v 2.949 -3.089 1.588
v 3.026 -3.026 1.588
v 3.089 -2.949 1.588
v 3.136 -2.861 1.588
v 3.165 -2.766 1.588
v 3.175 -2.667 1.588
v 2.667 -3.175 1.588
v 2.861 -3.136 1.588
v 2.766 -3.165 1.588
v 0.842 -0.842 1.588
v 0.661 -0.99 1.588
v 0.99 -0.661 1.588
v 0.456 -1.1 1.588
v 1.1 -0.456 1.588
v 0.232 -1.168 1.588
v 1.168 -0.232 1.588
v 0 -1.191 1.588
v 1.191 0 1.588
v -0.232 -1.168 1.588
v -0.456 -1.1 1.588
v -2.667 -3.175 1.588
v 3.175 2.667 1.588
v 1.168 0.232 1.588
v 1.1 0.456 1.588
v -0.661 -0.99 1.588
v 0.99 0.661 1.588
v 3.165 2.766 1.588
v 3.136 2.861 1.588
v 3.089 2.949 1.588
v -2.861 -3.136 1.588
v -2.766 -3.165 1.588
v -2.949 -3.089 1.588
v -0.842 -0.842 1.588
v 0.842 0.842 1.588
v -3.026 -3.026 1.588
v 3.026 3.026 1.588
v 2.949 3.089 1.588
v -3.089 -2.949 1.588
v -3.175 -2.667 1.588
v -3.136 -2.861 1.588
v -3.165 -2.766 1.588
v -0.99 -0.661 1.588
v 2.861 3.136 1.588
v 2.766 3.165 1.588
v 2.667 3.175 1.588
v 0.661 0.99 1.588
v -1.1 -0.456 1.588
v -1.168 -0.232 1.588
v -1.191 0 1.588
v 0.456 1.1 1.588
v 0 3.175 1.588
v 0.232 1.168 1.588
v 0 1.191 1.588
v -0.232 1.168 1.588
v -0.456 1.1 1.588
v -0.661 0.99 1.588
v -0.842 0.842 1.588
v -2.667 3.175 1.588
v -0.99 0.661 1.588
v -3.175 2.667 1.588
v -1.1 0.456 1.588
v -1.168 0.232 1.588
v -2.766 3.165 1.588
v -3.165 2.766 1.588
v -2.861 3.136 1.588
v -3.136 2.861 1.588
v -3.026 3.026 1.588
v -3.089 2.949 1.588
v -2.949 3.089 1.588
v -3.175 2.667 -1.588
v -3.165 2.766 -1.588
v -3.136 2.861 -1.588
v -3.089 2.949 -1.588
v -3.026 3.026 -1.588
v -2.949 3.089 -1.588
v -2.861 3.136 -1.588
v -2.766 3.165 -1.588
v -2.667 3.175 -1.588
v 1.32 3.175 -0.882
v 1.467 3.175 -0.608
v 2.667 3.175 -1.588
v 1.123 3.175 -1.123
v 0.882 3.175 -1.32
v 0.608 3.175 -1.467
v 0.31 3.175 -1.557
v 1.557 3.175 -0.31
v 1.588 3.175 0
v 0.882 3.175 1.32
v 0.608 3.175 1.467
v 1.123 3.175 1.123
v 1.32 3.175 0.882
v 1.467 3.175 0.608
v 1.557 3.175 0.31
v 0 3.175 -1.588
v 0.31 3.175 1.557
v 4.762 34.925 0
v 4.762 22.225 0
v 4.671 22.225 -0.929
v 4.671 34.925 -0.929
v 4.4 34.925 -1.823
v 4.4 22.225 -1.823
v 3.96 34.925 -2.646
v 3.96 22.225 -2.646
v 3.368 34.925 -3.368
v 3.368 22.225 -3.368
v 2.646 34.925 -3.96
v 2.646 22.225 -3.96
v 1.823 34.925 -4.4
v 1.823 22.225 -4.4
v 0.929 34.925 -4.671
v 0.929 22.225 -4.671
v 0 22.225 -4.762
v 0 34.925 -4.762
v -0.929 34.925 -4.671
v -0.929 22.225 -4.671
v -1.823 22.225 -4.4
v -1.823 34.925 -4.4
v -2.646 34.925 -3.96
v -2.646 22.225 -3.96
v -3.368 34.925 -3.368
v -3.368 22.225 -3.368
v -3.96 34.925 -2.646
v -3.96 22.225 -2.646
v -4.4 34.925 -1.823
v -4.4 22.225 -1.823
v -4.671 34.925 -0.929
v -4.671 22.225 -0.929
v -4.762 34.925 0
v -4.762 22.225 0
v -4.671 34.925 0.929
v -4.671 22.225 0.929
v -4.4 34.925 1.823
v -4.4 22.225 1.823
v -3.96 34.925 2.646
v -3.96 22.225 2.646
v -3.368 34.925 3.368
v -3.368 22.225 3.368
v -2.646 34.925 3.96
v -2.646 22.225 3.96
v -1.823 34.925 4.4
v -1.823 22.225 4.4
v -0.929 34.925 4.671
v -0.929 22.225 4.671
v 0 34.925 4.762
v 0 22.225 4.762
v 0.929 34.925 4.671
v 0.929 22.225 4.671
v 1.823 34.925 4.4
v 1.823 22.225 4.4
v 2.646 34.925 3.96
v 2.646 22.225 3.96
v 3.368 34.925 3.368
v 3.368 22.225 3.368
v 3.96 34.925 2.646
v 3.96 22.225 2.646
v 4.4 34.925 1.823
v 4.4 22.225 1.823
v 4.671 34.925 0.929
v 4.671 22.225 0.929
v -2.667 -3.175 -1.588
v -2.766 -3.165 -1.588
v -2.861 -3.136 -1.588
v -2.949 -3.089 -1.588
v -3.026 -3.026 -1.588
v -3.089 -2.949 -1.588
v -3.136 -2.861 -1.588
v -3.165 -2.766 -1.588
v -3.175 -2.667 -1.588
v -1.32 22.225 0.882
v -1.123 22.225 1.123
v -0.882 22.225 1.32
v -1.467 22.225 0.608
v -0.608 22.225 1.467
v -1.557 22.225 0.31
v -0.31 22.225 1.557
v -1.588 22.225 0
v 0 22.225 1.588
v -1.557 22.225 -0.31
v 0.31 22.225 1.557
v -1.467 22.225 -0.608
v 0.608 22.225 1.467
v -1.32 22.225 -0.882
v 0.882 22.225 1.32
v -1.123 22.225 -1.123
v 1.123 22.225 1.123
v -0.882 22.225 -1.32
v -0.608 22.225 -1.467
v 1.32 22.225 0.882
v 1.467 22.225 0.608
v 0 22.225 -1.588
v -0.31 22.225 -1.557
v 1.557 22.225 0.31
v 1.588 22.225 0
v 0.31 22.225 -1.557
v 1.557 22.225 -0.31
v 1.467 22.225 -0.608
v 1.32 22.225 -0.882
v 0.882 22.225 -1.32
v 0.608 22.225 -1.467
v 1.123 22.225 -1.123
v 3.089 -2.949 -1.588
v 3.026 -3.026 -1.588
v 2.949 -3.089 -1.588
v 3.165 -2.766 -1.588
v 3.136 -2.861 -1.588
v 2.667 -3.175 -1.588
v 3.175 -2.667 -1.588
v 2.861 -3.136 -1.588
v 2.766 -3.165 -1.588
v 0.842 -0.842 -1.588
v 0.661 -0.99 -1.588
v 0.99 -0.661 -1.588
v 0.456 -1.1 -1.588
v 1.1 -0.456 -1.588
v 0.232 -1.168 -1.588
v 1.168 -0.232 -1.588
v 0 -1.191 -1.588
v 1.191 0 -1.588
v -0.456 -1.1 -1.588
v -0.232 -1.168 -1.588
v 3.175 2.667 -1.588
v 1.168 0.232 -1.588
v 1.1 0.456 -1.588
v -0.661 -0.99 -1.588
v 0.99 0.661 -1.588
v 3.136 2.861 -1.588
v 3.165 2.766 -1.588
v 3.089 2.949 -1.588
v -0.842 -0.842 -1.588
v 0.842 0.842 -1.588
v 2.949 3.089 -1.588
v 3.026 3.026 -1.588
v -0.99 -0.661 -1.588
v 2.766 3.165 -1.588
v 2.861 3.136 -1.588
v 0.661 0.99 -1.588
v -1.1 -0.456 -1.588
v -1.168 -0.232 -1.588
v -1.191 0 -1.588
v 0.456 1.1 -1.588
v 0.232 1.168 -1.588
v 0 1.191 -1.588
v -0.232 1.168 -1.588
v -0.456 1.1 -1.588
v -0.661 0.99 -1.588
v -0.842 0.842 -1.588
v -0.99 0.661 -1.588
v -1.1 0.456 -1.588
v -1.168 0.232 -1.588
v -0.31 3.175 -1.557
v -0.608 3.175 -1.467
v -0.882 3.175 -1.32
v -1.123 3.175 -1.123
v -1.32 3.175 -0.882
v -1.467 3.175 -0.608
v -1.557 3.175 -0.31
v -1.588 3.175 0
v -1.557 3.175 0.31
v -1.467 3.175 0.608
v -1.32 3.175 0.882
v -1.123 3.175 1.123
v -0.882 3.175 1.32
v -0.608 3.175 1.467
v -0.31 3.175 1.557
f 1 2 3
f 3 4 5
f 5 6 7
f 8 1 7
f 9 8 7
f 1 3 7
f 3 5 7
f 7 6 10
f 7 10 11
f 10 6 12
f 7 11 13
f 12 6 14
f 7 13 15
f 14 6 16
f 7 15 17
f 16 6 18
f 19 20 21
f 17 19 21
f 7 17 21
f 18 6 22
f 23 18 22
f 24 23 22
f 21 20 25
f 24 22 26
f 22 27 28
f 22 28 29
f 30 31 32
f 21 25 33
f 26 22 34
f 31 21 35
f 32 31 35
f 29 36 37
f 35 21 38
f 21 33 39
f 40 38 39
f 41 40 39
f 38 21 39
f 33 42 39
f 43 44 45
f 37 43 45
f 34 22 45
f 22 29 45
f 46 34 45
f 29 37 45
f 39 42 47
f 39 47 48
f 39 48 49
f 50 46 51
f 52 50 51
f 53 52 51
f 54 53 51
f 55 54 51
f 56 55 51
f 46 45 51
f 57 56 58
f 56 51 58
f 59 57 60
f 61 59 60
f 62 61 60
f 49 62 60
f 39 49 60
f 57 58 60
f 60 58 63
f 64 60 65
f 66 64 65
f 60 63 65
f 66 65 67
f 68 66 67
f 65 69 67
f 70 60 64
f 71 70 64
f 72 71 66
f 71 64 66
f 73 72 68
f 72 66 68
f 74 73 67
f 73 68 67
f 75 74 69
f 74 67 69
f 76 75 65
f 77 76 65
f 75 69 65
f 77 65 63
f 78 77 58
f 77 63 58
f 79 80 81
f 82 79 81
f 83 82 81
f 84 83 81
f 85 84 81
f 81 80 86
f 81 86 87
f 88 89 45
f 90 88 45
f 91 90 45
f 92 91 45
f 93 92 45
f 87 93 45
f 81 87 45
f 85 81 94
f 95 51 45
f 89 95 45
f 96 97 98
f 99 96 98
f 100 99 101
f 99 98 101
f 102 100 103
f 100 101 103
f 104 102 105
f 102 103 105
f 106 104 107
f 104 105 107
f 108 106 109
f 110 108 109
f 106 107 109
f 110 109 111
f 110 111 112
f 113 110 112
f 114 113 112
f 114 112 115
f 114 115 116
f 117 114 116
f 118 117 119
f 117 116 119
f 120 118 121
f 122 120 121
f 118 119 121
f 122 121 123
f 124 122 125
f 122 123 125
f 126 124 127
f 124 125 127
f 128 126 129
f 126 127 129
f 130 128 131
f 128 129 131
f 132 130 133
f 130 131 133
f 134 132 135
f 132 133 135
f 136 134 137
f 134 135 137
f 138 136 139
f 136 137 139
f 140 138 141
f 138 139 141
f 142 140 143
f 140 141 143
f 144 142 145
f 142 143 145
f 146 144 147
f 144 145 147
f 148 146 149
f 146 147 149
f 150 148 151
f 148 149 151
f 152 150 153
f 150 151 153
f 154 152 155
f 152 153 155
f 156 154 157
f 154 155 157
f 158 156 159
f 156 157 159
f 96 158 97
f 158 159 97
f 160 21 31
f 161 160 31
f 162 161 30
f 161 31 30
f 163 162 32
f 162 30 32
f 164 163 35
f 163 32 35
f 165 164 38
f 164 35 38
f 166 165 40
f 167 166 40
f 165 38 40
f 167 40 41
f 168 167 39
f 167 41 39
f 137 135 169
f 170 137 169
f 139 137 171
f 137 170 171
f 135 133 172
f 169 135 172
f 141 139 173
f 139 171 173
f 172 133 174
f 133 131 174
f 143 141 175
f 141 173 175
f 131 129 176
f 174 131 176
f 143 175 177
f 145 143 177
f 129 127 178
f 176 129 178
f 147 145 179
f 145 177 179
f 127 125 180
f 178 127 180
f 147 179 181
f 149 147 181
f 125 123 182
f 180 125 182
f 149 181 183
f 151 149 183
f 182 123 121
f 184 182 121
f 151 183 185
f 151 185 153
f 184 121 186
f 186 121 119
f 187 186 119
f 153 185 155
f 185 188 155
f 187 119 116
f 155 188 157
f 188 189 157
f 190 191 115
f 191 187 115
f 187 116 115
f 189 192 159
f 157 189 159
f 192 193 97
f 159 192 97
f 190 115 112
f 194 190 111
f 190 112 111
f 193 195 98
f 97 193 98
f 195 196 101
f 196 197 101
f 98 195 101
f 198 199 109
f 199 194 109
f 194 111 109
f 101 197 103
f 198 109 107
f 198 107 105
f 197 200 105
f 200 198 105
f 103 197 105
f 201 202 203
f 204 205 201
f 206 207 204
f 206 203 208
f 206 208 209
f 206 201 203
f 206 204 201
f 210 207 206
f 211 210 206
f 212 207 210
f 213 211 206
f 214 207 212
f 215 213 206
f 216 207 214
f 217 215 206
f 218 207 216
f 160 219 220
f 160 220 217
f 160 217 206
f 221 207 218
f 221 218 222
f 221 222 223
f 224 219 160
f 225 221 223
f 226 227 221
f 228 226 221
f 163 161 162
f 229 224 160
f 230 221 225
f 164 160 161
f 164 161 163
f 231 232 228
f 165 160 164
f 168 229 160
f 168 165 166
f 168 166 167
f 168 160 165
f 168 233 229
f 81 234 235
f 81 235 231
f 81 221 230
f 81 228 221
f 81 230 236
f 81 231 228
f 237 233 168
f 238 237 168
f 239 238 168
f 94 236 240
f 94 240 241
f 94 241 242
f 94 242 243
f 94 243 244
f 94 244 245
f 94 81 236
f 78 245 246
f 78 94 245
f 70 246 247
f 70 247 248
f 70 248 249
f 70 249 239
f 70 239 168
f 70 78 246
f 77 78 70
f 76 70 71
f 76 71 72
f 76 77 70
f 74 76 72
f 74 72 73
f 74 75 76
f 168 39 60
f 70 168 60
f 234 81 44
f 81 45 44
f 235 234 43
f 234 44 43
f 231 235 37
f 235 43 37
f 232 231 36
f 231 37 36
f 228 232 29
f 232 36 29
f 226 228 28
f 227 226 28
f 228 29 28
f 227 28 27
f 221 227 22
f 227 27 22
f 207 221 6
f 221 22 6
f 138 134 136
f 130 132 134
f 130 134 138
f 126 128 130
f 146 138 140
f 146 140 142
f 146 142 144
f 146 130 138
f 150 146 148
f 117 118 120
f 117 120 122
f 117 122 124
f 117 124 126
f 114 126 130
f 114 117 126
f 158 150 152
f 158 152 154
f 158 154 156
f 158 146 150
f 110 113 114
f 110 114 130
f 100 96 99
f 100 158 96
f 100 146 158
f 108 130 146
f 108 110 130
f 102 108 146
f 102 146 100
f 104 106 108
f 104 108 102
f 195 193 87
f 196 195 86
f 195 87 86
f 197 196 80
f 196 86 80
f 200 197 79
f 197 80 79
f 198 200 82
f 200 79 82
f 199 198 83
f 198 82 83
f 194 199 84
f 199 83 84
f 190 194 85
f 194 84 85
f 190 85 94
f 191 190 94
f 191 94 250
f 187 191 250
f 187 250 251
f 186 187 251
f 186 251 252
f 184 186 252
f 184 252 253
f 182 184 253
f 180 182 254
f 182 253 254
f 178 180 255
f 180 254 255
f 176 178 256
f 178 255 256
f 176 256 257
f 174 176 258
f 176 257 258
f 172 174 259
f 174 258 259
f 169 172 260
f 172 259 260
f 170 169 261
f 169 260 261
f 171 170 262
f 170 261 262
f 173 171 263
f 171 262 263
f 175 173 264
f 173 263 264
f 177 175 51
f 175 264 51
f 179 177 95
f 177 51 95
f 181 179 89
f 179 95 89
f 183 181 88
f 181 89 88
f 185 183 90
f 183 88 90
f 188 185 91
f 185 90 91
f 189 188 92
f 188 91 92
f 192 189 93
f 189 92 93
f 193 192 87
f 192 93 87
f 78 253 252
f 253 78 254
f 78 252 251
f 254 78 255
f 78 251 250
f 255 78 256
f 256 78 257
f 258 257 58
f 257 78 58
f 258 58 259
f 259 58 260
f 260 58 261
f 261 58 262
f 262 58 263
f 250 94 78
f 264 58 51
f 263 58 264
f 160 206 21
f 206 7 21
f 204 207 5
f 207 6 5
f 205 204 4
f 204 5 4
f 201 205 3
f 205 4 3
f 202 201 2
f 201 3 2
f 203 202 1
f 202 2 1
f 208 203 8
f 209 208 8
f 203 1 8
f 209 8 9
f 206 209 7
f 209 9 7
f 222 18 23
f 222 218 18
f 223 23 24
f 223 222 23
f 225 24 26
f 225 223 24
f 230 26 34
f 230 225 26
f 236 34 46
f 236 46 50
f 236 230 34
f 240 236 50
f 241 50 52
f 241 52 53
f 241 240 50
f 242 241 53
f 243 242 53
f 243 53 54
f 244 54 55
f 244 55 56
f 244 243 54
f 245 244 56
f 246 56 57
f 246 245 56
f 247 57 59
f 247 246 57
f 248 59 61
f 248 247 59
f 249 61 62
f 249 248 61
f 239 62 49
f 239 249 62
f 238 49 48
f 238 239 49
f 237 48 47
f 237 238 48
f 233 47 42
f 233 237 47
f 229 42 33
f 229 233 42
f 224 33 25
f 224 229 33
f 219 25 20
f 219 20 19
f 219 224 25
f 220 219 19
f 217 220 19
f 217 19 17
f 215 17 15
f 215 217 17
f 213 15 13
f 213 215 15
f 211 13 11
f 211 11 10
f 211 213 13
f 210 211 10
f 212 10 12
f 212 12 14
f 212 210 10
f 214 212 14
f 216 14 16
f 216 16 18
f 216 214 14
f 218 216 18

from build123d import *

# Parameters (mm, degrees)
SKETCH2_R           = 1.190625
BOSS_EXTRUDE2_DEPTH = 1.5875
SKETCH6_R           = 1.5875
BOSS_EXTRUDE5_DEPTH = 19.05
SKETCH7_R           = 4.7625
BOSS_EXTRUDE6_DEPTH = 12.7


with BuildPart() as part:
    # Sketch2 → Boss-Extrude2 (new body, symmetric)
    with BuildSketch(Plane.XY):
        with BuildLine():
            Line((-2.667, 3.175), (-1.5875, 3.175))
            Line((-1.5875, 3.175), (1.5875, 3.175))
            Line((1.5875, 3.175), (2.667, 3.175))
            ThreePointArc((2.667, 3.175), (3.026210245, 3.026210245), (3.175, 2.667))
            Line((3.175, 2.667), (3.175, -2.667))
            ThreePointArc((3.175, -2.667), (3.026210245, -3.026210245), (2.667, -3.175))
            Line((2.667, -3.175), (-2.667, -3.175))
            ThreePointArc((-2.667, -3.175), (-3.026210245, -3.026210245), (-3.175, -2.667))
            Line((-3.175, -2.667), (-3.175, 2.667))
            ThreePointArc((-3.175, 2.667), (-3.026210245, 3.026210245), (-2.667, 3.175))
        make_face()
        Circle(SKETCH2_R, mode=Mode.SUBTRACT)
    extrude(amount=BOSS_EXTRUDE2_DEPTH, both=True)

    # Sketch6 → Boss-Extrude5 (add)
    with BuildSketch(Plane(origin=(0, 3.175, 0), x_dir=(1, 0, 0), z_dir=(0, 1, 0))):
        Circle(SKETCH6_R)
    extrude(amount=BOSS_EXTRUDE5_DEPTH)

    # Sketch7 → Boss-Extrude6 (add)
    with BuildSketch(Plane(origin=(0, 22.225, 0), x_dir=(1, 0, 0), z_dir=(0, 1, 0))):
        Circle(SKETCH7_R)
    extrude(amount=BOSS_EXTRUDE6_DEPTH)


solid = part.part
